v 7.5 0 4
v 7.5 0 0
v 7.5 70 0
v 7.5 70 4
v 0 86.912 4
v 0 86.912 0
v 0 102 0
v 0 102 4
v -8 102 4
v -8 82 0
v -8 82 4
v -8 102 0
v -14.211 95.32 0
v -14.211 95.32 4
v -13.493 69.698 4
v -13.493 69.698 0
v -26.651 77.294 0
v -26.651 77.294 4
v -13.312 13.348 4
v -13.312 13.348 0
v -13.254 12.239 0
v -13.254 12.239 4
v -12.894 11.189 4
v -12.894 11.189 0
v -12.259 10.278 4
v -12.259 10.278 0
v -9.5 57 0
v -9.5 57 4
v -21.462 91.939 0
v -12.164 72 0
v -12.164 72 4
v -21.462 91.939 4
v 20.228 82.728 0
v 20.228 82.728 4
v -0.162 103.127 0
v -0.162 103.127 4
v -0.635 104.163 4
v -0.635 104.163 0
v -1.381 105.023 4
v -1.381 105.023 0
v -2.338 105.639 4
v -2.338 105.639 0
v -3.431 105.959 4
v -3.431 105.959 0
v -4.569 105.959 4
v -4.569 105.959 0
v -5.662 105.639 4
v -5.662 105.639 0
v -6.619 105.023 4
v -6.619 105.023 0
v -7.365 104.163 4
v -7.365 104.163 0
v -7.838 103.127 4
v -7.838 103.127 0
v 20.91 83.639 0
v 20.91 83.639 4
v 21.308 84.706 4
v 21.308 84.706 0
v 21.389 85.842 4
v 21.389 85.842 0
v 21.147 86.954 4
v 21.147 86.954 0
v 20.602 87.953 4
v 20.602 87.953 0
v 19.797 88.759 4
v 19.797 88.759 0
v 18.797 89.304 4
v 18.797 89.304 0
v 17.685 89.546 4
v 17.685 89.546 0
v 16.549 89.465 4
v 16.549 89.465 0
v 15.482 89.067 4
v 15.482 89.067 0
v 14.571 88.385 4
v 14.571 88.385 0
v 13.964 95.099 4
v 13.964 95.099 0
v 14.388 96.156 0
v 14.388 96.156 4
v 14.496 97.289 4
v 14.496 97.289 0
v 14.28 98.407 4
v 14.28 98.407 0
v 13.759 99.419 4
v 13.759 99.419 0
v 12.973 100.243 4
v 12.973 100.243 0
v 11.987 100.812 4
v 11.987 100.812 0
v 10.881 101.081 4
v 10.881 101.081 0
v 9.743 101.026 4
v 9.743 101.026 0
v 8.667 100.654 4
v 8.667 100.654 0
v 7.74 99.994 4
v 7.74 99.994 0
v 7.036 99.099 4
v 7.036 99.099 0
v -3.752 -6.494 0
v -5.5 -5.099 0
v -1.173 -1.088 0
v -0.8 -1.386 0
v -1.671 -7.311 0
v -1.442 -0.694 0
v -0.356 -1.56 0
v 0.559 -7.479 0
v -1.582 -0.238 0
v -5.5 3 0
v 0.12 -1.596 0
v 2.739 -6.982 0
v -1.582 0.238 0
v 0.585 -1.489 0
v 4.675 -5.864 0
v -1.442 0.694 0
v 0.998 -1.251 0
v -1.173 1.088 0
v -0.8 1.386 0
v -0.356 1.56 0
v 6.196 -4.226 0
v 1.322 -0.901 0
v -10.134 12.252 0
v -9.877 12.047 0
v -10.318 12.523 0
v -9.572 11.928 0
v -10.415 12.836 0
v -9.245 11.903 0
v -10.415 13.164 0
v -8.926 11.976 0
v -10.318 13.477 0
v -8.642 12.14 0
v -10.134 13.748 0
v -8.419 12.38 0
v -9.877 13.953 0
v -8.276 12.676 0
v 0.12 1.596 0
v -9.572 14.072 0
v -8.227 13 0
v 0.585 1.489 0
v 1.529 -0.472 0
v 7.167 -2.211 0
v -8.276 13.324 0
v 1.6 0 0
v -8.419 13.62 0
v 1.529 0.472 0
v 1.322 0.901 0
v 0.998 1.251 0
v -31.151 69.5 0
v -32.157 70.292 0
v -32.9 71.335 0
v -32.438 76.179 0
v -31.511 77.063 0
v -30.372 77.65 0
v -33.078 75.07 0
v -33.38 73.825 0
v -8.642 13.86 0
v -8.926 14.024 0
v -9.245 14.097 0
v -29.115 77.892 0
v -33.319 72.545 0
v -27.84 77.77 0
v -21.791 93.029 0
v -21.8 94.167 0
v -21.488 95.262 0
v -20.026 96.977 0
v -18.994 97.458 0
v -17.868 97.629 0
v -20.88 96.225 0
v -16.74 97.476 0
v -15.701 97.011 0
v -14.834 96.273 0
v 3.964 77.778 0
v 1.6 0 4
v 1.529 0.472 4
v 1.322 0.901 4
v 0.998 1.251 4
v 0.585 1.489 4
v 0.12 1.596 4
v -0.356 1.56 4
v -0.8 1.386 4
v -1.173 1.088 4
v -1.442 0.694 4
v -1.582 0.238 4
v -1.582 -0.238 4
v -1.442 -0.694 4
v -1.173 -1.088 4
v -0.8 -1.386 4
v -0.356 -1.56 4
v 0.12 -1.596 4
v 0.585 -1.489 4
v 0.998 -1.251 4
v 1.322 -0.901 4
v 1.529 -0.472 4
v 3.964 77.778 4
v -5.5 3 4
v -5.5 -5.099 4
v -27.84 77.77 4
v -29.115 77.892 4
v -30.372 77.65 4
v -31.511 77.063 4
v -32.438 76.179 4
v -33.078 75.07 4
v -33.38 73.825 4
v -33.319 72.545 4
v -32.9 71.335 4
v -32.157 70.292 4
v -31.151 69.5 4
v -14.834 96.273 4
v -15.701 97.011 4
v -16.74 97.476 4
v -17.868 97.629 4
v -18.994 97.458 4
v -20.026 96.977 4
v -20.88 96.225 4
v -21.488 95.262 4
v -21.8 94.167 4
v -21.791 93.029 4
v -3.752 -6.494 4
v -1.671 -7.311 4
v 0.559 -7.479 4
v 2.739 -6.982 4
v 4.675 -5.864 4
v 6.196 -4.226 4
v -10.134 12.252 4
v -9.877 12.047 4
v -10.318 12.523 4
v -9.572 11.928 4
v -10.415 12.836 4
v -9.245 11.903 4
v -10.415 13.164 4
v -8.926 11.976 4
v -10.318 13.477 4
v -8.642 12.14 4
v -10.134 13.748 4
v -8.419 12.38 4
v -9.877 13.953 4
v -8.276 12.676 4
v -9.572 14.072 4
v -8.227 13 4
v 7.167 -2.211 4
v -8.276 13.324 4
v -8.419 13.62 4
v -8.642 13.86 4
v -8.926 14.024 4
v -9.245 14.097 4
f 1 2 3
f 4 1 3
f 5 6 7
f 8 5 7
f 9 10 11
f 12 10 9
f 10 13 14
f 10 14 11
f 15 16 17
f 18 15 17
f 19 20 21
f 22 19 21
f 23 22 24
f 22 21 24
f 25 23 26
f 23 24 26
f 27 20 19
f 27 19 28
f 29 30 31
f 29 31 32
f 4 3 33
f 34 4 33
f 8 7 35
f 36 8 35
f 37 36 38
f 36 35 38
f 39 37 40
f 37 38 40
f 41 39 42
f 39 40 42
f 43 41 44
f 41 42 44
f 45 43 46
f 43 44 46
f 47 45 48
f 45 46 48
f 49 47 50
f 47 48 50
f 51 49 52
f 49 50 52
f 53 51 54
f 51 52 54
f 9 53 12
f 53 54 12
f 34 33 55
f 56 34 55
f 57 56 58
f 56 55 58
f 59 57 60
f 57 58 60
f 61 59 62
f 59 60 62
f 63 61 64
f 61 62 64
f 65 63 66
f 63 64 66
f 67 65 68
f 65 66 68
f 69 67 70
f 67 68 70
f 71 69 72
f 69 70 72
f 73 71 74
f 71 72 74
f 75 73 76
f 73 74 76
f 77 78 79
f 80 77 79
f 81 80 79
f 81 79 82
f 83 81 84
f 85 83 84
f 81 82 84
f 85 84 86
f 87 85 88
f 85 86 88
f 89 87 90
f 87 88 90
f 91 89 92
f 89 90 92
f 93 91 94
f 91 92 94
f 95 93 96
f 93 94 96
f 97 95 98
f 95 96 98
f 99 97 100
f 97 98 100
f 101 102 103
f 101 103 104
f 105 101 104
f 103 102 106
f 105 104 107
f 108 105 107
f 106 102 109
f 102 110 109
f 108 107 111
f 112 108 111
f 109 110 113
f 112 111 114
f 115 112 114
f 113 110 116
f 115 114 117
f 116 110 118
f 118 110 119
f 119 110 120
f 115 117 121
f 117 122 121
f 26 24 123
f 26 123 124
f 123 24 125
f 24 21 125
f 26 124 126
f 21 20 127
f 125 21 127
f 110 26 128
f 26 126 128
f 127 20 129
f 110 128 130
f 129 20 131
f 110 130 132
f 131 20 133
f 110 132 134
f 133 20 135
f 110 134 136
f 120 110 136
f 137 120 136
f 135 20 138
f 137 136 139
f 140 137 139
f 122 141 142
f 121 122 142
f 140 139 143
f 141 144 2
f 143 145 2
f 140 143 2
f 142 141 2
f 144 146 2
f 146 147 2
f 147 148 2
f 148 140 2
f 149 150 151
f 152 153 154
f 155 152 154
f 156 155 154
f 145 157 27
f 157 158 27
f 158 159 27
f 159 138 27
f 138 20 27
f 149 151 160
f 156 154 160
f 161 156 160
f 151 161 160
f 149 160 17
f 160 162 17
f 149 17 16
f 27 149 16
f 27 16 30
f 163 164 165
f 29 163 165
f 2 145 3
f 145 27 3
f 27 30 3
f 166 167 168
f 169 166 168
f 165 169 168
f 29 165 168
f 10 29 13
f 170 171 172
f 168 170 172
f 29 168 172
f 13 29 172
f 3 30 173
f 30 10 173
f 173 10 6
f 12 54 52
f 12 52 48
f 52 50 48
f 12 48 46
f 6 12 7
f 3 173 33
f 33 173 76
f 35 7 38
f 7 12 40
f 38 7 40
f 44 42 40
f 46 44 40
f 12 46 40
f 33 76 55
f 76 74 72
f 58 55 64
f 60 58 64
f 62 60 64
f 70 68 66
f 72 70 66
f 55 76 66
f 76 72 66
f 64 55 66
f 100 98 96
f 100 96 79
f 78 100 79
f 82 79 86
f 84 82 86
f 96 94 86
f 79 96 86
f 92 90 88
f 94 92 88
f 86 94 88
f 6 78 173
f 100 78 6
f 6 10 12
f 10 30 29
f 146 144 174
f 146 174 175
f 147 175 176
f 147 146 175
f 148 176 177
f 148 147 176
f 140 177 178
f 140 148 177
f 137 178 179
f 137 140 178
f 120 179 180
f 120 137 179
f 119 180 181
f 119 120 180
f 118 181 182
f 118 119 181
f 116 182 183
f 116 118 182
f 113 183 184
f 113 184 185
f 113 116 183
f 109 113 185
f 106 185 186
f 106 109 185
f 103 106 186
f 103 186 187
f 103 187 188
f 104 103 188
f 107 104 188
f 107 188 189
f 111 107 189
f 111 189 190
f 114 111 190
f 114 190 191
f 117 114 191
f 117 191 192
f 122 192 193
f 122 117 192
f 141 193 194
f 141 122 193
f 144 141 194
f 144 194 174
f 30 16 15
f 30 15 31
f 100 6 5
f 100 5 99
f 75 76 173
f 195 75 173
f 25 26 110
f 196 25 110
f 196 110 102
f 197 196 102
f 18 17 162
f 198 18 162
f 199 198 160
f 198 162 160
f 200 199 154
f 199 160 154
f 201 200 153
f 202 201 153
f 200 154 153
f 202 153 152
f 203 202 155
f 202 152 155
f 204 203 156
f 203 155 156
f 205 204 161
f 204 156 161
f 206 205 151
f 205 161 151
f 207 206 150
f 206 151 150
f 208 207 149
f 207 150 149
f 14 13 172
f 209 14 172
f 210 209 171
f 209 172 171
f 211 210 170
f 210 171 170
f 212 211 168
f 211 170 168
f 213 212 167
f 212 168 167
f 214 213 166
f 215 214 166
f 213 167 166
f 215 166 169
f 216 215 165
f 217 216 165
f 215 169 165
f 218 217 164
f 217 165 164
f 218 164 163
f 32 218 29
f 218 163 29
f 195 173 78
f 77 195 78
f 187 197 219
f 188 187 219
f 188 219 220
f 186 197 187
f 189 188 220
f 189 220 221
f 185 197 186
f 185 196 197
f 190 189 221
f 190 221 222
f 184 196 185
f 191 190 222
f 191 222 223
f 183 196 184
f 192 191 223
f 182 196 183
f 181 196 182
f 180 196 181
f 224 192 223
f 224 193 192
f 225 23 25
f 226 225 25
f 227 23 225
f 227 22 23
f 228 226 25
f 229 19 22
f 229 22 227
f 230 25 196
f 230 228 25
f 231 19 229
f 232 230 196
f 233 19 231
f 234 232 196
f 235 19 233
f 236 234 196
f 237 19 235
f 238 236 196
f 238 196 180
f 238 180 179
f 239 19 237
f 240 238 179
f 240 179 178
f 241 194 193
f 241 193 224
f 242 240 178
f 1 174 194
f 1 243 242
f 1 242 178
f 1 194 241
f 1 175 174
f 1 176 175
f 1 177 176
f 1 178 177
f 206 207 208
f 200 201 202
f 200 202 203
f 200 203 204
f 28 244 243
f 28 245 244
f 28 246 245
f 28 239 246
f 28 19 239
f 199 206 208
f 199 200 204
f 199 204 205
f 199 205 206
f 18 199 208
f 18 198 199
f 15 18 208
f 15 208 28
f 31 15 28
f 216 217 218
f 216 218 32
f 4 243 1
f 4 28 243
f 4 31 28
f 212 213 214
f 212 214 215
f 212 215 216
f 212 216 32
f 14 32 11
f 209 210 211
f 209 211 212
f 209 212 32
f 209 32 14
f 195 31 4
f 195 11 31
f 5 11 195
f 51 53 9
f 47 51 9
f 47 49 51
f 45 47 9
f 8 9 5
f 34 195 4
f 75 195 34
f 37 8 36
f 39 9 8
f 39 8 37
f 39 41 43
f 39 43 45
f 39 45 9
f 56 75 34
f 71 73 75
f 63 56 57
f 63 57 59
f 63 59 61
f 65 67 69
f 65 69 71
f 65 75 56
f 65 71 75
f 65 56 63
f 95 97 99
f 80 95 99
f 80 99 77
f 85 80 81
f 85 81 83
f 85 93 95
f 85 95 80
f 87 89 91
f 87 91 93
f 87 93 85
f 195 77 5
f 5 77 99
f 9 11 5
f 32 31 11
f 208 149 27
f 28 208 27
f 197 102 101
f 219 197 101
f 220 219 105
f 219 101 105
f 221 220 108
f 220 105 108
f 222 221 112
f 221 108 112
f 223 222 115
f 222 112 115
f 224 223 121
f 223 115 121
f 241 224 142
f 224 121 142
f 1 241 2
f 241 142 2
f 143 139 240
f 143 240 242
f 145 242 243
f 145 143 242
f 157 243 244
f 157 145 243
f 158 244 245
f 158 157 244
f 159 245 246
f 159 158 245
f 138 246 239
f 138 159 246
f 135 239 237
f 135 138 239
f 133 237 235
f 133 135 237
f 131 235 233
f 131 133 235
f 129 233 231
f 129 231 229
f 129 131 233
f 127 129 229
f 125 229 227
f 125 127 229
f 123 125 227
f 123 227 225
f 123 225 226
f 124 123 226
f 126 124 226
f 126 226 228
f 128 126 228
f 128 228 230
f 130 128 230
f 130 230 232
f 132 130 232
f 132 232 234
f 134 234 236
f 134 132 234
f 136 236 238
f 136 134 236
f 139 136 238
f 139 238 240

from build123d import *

# Parameters (mm, degrees)
SKETCH_R   = 1.6
SKETCH_R_2 = 1.1
PAD_DEPTH  = 4


with BuildPart() as part:
    # Sketch → Pad (new body)
    with BuildSketch(Plane.XY):
        with BuildLine():
            Line((7.5, 0), (7.5, 70))
            Line((7.5, 70), (20.227922, 82.727922))
            ThreePointArc((20.227922, 82.727922), (20.227922, 88.384776), (14.571068, 88.384776))
            Line((14.571068, 88.384776), (3.964466, 77.778175))
            Line((3.964466, 77.778175), (13.964466, 95.098683))
            ThreePointArc((13.964466, 95.098683), (12.500364, 100.562784), (7.036263, 99.098683))
            Line((0, 86.911518), (7.036263, 99.098683))
            Line((0, 86.911518), (0, 102))
            ThreePointArc((0, 102), (-4, 106), (-8, 102))
            Line((-8, 82), (-8, 102))
            Line((-14.211086, 95.319717), (-8, 82))
            ThreePointArc((-14.211086, 95.319717), (-19.52679, 97.254476), (-21.461549, 91.938771))
            Line((-12.163947, 72), (-21.461549, 91.938771))
            Line((-13.493151, 69.697751), (-12.163947, 72))
            Line((-13.493151, 69.697751), (-26.650635, 77.294229))
            ThreePointArc((-26.650635, 77.294229), (-32.797749, 75.647114), (-31.150635, 69.5))
            Line((-31.150635, 69.5), (-9.5, 57))
            Line((-13.312212, 13.348003), (-9.5, 57))
            ThreePointArc((-13.312212, 13.348003), (-13.110715, 11.701399), (-12.258507, 10.278146))
            Line((-12.258507, 10.278146), (-5.5, 3))
            Line((-5.5, 3), (-5.5, -5.09902))
            ThreePointArc((-5.5, -5.09902), (2.738613, -6.98212), (7.5, 0))
        make_face()
        Circle(SKETCH_R, mode=Mode.SUBTRACT)
        with Locations((-9.327379, 13)):
            Circle(SKETCH_R_2, mode=Mode.SUBTRACT)
    extrude(amount=PAD_DEPTH)


solid = part.part
